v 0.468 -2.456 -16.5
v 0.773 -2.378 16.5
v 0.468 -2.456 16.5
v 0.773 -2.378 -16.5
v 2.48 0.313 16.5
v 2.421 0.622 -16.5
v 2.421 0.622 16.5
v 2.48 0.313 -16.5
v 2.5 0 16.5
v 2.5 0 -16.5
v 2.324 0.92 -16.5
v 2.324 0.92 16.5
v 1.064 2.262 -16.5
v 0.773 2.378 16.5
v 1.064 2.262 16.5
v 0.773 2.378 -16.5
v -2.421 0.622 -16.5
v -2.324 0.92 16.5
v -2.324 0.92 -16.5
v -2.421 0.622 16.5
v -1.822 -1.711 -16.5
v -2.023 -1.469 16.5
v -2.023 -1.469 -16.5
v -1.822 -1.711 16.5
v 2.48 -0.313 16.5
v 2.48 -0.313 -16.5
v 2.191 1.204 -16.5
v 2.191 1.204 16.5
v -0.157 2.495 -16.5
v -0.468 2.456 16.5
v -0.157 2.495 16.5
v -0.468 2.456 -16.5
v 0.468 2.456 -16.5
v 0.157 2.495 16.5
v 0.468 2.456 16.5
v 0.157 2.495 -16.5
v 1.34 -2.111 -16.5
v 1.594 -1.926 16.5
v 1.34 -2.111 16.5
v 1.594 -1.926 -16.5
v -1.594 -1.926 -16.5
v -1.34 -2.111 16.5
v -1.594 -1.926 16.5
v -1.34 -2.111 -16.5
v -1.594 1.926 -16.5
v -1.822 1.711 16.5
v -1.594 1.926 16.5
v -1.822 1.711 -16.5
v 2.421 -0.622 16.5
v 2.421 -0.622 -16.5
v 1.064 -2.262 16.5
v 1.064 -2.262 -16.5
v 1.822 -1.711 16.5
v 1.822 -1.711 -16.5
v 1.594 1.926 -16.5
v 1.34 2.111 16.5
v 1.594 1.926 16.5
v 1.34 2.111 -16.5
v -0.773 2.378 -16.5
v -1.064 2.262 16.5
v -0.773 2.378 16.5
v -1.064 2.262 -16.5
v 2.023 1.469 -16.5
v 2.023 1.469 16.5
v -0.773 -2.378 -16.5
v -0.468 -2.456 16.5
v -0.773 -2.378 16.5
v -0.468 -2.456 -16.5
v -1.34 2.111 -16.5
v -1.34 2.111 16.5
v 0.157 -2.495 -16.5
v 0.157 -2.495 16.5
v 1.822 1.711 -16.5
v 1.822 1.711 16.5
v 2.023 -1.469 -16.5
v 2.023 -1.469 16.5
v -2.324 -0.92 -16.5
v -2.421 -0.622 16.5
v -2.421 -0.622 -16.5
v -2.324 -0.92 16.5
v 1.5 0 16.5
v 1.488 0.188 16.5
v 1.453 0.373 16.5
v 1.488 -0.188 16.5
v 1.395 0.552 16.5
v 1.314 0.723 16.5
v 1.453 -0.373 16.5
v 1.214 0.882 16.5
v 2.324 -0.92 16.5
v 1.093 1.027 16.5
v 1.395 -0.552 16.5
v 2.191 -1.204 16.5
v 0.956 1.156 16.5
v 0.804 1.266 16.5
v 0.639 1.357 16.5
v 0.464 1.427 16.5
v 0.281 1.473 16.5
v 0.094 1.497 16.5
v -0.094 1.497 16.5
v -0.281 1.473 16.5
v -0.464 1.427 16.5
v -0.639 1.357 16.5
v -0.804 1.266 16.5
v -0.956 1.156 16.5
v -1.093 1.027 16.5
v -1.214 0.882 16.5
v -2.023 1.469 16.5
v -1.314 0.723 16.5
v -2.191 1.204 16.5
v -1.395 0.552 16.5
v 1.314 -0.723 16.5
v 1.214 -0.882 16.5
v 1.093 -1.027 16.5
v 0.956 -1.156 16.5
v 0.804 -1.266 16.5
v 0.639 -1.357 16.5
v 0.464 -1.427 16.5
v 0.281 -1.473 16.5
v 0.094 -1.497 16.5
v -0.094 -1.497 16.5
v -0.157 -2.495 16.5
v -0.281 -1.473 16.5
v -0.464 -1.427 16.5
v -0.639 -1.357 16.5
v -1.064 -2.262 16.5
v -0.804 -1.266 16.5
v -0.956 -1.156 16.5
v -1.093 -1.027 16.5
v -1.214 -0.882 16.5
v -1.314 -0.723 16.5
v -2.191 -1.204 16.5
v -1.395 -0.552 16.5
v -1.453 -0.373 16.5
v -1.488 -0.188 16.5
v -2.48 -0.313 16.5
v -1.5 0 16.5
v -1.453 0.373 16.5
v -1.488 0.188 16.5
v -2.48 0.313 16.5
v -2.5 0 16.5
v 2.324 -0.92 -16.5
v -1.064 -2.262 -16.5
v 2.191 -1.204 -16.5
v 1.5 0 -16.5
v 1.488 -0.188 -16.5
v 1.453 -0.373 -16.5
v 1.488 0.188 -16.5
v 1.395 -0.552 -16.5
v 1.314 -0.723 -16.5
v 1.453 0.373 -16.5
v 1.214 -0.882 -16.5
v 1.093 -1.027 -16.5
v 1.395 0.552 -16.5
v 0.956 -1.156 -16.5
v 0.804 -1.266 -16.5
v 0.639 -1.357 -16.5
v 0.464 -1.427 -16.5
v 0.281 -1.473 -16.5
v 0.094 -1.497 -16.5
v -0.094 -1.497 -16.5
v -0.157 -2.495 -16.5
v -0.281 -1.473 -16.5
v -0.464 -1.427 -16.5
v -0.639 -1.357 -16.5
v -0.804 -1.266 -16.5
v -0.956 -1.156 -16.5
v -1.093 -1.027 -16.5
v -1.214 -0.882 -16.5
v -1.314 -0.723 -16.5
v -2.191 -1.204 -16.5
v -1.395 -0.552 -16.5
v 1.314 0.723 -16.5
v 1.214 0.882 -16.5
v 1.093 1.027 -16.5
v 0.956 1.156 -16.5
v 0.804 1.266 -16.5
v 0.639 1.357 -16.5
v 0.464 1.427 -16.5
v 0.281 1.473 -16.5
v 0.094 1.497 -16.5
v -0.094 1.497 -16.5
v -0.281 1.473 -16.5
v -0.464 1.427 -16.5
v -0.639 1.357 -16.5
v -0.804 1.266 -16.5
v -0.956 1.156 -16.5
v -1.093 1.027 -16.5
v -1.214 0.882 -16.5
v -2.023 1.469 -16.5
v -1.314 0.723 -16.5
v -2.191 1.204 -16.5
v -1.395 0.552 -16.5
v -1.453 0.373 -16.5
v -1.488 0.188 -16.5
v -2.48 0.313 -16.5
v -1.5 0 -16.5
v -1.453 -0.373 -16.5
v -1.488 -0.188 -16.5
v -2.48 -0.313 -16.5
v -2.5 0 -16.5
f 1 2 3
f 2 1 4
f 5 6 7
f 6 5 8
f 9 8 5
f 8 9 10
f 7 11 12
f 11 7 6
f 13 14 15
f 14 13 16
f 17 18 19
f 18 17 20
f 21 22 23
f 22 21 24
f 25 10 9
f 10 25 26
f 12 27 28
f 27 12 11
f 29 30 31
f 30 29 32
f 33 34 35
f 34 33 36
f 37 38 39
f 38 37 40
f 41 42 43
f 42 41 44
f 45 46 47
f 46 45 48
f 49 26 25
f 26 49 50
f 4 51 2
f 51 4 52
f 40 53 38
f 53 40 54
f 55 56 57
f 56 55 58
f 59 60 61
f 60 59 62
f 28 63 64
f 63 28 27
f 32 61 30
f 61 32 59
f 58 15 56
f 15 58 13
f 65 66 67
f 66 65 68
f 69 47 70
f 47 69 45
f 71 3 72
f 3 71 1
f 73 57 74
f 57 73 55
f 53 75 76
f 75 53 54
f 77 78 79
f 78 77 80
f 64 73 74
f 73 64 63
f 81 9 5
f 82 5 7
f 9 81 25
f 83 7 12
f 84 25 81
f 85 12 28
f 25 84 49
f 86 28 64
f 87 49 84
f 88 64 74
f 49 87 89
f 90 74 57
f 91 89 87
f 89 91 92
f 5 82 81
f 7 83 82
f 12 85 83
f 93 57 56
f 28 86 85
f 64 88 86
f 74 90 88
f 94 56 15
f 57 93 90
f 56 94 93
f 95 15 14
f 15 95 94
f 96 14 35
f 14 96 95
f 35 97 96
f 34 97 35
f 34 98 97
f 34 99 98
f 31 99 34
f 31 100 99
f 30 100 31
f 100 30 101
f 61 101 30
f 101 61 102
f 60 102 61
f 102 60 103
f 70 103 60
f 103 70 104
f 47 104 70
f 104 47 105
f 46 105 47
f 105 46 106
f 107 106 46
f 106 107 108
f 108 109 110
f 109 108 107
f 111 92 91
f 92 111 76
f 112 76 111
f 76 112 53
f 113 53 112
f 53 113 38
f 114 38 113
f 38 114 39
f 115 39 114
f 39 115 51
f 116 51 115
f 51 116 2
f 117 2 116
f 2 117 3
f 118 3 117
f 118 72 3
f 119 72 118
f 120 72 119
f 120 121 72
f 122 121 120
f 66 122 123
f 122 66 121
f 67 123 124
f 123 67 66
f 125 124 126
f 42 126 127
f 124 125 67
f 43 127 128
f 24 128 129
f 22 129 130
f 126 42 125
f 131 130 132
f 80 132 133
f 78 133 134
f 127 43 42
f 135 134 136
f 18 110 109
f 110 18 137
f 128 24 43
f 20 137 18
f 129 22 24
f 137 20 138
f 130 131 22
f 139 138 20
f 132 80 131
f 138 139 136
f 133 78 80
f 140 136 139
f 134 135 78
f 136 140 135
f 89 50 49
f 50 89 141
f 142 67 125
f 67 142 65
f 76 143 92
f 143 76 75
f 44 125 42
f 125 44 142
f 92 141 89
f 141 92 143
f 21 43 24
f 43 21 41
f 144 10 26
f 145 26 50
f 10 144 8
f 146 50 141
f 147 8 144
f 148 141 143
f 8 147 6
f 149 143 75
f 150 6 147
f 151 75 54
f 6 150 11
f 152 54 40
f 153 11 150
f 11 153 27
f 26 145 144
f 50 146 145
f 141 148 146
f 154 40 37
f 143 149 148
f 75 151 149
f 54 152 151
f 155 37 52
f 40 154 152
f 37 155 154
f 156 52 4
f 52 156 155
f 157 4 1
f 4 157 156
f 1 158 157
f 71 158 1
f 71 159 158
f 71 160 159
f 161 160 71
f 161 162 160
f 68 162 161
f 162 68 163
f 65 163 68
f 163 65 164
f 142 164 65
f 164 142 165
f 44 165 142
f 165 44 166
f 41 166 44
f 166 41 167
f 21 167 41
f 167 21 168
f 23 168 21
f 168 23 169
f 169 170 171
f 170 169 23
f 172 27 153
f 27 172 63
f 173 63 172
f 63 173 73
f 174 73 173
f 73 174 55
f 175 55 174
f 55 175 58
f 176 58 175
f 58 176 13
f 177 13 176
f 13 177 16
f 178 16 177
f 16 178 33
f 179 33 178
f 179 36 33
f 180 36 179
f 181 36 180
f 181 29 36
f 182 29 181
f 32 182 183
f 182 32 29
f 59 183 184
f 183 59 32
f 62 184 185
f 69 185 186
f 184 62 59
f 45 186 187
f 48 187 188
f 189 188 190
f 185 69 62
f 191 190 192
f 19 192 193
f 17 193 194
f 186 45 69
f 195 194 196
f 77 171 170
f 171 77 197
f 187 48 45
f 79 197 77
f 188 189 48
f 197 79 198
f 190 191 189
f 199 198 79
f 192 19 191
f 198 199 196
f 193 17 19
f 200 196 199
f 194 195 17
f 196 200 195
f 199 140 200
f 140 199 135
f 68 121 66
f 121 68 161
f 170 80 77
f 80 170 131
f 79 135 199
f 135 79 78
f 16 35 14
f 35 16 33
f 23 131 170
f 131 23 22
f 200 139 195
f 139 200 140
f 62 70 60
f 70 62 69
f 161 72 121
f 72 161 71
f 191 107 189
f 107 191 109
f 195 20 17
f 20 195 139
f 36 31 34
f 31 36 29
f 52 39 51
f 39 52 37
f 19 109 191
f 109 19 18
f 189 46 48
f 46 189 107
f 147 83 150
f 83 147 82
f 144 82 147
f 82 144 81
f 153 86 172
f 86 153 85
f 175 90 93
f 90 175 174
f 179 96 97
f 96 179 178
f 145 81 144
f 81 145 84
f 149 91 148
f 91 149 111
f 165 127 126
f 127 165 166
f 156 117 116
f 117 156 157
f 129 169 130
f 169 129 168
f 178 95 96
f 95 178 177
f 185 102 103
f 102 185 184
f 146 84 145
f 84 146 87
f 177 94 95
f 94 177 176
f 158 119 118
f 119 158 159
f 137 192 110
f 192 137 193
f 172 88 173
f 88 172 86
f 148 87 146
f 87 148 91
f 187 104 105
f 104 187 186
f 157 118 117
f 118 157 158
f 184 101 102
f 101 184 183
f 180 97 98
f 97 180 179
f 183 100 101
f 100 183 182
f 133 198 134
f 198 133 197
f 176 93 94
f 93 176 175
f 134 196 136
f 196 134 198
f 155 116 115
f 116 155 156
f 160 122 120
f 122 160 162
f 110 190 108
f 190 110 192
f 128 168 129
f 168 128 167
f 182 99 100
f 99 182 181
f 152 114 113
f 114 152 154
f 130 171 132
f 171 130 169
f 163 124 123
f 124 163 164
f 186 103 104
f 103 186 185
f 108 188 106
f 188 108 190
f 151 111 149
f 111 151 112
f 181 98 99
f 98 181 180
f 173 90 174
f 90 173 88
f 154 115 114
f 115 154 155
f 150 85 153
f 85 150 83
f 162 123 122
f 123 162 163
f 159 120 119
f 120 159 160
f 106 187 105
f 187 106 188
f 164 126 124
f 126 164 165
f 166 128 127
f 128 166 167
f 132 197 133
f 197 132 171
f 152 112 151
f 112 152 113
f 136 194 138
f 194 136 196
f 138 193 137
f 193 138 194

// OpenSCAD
$fn = 50;


difference() {
	union() {
		translate(v = [0, 0, -16.5000000000]) {
			cylinder(h = 33, r = 2.5000000000);
		}
	}
	union() {
		translate(v = [0, 0, -100.0000000000]) {
			cylinder(h = 200, r = 1.5000000000);
		}
	}
}
